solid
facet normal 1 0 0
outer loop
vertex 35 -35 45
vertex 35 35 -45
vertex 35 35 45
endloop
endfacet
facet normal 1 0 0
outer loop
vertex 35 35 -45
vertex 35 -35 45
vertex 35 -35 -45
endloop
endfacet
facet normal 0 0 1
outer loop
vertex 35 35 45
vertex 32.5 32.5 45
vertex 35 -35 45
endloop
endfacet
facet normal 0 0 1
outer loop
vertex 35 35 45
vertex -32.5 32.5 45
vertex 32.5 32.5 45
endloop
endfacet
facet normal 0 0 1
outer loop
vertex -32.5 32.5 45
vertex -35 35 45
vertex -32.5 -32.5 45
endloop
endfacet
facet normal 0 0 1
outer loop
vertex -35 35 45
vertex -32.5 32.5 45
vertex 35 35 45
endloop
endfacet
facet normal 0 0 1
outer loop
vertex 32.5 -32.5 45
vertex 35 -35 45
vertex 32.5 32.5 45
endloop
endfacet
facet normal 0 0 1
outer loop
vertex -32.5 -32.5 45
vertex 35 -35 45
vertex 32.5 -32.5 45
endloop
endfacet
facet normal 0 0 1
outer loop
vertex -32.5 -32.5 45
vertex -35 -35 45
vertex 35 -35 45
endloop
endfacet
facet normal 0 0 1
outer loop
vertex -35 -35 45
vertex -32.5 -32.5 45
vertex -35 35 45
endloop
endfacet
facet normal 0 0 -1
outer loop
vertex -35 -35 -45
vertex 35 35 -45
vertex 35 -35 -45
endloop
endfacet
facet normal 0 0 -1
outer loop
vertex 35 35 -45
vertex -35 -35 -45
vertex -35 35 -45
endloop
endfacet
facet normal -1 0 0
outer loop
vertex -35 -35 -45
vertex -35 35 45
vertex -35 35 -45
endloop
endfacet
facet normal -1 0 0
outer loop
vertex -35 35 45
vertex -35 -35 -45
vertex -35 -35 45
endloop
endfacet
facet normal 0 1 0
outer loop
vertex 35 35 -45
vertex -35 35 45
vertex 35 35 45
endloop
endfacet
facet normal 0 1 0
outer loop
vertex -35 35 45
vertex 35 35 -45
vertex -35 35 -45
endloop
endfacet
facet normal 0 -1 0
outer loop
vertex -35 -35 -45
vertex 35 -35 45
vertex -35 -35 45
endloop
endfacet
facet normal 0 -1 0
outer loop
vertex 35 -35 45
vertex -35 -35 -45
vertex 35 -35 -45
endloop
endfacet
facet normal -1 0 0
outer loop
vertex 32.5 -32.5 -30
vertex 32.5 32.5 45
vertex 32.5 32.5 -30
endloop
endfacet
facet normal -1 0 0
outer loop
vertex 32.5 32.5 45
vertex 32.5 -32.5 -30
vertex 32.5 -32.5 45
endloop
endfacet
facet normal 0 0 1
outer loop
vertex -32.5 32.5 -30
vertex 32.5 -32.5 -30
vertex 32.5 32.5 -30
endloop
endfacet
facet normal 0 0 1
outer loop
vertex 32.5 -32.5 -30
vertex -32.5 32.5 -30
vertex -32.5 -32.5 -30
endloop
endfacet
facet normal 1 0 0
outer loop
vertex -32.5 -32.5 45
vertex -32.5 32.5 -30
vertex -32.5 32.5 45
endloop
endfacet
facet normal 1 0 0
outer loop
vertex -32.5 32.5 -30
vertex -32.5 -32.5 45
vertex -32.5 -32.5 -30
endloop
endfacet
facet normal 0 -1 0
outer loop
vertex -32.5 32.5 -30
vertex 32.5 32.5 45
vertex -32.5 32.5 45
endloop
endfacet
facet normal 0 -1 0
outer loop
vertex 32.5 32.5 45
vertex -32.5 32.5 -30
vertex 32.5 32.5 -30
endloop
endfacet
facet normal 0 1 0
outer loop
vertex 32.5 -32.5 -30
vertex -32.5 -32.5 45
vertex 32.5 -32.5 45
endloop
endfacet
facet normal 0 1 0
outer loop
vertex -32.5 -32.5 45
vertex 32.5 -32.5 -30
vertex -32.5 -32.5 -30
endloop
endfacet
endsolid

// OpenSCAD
// bicchiere quadrato
base_larghezza = 70;
base_lunghezza = base_larghezza;
base_altezza = 90;
spessore = 5;
rialzo = 10;
top_larghezza = base_larghezza - spessore;
top_lunghezza = base_lunghezza - spessore;
top_altezza = base_altezza - rialzo;

difference() {
    // esterno
    cube([base_larghezza, base_lunghezza, base_altezza], center = true);

    // interno
    translate([0,0,rialzo])
    cube([top_larghezza, top_lunghezza, top_altezza], center = true);

}
